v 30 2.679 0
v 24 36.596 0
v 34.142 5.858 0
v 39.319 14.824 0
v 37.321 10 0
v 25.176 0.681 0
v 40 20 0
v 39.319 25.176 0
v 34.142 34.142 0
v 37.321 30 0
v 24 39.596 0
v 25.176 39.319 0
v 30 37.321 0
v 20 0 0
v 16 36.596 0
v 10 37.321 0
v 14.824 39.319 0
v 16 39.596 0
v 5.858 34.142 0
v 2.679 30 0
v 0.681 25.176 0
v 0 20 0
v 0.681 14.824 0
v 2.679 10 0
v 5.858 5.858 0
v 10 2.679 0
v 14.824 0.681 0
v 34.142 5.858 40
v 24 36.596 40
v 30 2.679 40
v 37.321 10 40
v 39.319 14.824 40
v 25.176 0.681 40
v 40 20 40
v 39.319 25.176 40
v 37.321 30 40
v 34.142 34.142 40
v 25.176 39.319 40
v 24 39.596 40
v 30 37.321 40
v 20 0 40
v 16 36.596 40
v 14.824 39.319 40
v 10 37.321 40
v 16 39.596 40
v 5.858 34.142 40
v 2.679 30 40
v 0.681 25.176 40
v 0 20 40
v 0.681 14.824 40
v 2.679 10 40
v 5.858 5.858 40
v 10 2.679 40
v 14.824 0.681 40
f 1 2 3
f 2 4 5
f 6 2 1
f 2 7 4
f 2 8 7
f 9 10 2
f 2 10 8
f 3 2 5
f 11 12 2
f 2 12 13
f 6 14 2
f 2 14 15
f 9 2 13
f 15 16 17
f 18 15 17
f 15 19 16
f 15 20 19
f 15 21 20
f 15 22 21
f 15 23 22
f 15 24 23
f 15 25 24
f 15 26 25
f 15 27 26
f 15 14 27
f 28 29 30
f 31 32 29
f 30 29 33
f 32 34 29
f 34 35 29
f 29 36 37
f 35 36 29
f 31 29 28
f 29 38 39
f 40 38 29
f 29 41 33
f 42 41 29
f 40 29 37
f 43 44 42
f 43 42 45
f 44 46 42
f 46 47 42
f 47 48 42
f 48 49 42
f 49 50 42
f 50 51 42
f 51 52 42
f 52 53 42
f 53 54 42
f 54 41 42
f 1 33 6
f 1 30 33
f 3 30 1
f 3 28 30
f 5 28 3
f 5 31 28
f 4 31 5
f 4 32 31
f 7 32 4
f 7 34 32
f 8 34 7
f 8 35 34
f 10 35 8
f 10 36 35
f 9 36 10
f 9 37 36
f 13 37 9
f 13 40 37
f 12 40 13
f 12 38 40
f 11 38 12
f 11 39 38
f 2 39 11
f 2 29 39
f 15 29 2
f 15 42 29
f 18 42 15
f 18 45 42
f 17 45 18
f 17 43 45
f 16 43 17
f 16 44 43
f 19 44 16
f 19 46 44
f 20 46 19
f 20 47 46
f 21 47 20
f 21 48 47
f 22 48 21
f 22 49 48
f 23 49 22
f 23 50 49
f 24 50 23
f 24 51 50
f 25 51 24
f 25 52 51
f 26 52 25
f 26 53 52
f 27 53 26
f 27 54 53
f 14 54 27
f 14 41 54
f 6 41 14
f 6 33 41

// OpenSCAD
$fn = 32;

// ----------------------------------------------------------------------
// Keyway shaft: d40 shaft, key 8 x 3 mm
// ----------------------------------------------------------------------

// --- parameters (mm) ---
shaft_r = 20;             // shaft radius
key_w = 8;                // keyway width
key_d = 3;                // keyway depth below the surface line
plate_t = 40;             // shaft length, Z (extrusion height)

shaft_d = 2 * shaft_r;  // shaft diameter
circle_step = 15;  // polygon sampling step, degrees

profile = [[14.824, 39.319], [10, 37.321], [5.858, 34.142], [2.679, 30], [0.681, 25.176], [0, 20], [0.681, 14.824], [2.679, 10], [5.858, 5.858], [10, 2.679], [14.824, 0.681], [20, 0], [25.176, 0.681], [30, 2.679], [34.142, 5.858], [37.321, 10], [39.319, 14.824], [40, 20], [39.319, 25.176], [37.321, 30], [34.142, 34.142], [30, 37.321], [25.176, 39.319], [24, 39.596], [24, 36.596], [16, 36.596], [16, 39.596]];  // primary outline, 27 points, counter clockwise

// --- the one profile operation ---
linear_extrude(height = plate_t) polygon(points = profile);
